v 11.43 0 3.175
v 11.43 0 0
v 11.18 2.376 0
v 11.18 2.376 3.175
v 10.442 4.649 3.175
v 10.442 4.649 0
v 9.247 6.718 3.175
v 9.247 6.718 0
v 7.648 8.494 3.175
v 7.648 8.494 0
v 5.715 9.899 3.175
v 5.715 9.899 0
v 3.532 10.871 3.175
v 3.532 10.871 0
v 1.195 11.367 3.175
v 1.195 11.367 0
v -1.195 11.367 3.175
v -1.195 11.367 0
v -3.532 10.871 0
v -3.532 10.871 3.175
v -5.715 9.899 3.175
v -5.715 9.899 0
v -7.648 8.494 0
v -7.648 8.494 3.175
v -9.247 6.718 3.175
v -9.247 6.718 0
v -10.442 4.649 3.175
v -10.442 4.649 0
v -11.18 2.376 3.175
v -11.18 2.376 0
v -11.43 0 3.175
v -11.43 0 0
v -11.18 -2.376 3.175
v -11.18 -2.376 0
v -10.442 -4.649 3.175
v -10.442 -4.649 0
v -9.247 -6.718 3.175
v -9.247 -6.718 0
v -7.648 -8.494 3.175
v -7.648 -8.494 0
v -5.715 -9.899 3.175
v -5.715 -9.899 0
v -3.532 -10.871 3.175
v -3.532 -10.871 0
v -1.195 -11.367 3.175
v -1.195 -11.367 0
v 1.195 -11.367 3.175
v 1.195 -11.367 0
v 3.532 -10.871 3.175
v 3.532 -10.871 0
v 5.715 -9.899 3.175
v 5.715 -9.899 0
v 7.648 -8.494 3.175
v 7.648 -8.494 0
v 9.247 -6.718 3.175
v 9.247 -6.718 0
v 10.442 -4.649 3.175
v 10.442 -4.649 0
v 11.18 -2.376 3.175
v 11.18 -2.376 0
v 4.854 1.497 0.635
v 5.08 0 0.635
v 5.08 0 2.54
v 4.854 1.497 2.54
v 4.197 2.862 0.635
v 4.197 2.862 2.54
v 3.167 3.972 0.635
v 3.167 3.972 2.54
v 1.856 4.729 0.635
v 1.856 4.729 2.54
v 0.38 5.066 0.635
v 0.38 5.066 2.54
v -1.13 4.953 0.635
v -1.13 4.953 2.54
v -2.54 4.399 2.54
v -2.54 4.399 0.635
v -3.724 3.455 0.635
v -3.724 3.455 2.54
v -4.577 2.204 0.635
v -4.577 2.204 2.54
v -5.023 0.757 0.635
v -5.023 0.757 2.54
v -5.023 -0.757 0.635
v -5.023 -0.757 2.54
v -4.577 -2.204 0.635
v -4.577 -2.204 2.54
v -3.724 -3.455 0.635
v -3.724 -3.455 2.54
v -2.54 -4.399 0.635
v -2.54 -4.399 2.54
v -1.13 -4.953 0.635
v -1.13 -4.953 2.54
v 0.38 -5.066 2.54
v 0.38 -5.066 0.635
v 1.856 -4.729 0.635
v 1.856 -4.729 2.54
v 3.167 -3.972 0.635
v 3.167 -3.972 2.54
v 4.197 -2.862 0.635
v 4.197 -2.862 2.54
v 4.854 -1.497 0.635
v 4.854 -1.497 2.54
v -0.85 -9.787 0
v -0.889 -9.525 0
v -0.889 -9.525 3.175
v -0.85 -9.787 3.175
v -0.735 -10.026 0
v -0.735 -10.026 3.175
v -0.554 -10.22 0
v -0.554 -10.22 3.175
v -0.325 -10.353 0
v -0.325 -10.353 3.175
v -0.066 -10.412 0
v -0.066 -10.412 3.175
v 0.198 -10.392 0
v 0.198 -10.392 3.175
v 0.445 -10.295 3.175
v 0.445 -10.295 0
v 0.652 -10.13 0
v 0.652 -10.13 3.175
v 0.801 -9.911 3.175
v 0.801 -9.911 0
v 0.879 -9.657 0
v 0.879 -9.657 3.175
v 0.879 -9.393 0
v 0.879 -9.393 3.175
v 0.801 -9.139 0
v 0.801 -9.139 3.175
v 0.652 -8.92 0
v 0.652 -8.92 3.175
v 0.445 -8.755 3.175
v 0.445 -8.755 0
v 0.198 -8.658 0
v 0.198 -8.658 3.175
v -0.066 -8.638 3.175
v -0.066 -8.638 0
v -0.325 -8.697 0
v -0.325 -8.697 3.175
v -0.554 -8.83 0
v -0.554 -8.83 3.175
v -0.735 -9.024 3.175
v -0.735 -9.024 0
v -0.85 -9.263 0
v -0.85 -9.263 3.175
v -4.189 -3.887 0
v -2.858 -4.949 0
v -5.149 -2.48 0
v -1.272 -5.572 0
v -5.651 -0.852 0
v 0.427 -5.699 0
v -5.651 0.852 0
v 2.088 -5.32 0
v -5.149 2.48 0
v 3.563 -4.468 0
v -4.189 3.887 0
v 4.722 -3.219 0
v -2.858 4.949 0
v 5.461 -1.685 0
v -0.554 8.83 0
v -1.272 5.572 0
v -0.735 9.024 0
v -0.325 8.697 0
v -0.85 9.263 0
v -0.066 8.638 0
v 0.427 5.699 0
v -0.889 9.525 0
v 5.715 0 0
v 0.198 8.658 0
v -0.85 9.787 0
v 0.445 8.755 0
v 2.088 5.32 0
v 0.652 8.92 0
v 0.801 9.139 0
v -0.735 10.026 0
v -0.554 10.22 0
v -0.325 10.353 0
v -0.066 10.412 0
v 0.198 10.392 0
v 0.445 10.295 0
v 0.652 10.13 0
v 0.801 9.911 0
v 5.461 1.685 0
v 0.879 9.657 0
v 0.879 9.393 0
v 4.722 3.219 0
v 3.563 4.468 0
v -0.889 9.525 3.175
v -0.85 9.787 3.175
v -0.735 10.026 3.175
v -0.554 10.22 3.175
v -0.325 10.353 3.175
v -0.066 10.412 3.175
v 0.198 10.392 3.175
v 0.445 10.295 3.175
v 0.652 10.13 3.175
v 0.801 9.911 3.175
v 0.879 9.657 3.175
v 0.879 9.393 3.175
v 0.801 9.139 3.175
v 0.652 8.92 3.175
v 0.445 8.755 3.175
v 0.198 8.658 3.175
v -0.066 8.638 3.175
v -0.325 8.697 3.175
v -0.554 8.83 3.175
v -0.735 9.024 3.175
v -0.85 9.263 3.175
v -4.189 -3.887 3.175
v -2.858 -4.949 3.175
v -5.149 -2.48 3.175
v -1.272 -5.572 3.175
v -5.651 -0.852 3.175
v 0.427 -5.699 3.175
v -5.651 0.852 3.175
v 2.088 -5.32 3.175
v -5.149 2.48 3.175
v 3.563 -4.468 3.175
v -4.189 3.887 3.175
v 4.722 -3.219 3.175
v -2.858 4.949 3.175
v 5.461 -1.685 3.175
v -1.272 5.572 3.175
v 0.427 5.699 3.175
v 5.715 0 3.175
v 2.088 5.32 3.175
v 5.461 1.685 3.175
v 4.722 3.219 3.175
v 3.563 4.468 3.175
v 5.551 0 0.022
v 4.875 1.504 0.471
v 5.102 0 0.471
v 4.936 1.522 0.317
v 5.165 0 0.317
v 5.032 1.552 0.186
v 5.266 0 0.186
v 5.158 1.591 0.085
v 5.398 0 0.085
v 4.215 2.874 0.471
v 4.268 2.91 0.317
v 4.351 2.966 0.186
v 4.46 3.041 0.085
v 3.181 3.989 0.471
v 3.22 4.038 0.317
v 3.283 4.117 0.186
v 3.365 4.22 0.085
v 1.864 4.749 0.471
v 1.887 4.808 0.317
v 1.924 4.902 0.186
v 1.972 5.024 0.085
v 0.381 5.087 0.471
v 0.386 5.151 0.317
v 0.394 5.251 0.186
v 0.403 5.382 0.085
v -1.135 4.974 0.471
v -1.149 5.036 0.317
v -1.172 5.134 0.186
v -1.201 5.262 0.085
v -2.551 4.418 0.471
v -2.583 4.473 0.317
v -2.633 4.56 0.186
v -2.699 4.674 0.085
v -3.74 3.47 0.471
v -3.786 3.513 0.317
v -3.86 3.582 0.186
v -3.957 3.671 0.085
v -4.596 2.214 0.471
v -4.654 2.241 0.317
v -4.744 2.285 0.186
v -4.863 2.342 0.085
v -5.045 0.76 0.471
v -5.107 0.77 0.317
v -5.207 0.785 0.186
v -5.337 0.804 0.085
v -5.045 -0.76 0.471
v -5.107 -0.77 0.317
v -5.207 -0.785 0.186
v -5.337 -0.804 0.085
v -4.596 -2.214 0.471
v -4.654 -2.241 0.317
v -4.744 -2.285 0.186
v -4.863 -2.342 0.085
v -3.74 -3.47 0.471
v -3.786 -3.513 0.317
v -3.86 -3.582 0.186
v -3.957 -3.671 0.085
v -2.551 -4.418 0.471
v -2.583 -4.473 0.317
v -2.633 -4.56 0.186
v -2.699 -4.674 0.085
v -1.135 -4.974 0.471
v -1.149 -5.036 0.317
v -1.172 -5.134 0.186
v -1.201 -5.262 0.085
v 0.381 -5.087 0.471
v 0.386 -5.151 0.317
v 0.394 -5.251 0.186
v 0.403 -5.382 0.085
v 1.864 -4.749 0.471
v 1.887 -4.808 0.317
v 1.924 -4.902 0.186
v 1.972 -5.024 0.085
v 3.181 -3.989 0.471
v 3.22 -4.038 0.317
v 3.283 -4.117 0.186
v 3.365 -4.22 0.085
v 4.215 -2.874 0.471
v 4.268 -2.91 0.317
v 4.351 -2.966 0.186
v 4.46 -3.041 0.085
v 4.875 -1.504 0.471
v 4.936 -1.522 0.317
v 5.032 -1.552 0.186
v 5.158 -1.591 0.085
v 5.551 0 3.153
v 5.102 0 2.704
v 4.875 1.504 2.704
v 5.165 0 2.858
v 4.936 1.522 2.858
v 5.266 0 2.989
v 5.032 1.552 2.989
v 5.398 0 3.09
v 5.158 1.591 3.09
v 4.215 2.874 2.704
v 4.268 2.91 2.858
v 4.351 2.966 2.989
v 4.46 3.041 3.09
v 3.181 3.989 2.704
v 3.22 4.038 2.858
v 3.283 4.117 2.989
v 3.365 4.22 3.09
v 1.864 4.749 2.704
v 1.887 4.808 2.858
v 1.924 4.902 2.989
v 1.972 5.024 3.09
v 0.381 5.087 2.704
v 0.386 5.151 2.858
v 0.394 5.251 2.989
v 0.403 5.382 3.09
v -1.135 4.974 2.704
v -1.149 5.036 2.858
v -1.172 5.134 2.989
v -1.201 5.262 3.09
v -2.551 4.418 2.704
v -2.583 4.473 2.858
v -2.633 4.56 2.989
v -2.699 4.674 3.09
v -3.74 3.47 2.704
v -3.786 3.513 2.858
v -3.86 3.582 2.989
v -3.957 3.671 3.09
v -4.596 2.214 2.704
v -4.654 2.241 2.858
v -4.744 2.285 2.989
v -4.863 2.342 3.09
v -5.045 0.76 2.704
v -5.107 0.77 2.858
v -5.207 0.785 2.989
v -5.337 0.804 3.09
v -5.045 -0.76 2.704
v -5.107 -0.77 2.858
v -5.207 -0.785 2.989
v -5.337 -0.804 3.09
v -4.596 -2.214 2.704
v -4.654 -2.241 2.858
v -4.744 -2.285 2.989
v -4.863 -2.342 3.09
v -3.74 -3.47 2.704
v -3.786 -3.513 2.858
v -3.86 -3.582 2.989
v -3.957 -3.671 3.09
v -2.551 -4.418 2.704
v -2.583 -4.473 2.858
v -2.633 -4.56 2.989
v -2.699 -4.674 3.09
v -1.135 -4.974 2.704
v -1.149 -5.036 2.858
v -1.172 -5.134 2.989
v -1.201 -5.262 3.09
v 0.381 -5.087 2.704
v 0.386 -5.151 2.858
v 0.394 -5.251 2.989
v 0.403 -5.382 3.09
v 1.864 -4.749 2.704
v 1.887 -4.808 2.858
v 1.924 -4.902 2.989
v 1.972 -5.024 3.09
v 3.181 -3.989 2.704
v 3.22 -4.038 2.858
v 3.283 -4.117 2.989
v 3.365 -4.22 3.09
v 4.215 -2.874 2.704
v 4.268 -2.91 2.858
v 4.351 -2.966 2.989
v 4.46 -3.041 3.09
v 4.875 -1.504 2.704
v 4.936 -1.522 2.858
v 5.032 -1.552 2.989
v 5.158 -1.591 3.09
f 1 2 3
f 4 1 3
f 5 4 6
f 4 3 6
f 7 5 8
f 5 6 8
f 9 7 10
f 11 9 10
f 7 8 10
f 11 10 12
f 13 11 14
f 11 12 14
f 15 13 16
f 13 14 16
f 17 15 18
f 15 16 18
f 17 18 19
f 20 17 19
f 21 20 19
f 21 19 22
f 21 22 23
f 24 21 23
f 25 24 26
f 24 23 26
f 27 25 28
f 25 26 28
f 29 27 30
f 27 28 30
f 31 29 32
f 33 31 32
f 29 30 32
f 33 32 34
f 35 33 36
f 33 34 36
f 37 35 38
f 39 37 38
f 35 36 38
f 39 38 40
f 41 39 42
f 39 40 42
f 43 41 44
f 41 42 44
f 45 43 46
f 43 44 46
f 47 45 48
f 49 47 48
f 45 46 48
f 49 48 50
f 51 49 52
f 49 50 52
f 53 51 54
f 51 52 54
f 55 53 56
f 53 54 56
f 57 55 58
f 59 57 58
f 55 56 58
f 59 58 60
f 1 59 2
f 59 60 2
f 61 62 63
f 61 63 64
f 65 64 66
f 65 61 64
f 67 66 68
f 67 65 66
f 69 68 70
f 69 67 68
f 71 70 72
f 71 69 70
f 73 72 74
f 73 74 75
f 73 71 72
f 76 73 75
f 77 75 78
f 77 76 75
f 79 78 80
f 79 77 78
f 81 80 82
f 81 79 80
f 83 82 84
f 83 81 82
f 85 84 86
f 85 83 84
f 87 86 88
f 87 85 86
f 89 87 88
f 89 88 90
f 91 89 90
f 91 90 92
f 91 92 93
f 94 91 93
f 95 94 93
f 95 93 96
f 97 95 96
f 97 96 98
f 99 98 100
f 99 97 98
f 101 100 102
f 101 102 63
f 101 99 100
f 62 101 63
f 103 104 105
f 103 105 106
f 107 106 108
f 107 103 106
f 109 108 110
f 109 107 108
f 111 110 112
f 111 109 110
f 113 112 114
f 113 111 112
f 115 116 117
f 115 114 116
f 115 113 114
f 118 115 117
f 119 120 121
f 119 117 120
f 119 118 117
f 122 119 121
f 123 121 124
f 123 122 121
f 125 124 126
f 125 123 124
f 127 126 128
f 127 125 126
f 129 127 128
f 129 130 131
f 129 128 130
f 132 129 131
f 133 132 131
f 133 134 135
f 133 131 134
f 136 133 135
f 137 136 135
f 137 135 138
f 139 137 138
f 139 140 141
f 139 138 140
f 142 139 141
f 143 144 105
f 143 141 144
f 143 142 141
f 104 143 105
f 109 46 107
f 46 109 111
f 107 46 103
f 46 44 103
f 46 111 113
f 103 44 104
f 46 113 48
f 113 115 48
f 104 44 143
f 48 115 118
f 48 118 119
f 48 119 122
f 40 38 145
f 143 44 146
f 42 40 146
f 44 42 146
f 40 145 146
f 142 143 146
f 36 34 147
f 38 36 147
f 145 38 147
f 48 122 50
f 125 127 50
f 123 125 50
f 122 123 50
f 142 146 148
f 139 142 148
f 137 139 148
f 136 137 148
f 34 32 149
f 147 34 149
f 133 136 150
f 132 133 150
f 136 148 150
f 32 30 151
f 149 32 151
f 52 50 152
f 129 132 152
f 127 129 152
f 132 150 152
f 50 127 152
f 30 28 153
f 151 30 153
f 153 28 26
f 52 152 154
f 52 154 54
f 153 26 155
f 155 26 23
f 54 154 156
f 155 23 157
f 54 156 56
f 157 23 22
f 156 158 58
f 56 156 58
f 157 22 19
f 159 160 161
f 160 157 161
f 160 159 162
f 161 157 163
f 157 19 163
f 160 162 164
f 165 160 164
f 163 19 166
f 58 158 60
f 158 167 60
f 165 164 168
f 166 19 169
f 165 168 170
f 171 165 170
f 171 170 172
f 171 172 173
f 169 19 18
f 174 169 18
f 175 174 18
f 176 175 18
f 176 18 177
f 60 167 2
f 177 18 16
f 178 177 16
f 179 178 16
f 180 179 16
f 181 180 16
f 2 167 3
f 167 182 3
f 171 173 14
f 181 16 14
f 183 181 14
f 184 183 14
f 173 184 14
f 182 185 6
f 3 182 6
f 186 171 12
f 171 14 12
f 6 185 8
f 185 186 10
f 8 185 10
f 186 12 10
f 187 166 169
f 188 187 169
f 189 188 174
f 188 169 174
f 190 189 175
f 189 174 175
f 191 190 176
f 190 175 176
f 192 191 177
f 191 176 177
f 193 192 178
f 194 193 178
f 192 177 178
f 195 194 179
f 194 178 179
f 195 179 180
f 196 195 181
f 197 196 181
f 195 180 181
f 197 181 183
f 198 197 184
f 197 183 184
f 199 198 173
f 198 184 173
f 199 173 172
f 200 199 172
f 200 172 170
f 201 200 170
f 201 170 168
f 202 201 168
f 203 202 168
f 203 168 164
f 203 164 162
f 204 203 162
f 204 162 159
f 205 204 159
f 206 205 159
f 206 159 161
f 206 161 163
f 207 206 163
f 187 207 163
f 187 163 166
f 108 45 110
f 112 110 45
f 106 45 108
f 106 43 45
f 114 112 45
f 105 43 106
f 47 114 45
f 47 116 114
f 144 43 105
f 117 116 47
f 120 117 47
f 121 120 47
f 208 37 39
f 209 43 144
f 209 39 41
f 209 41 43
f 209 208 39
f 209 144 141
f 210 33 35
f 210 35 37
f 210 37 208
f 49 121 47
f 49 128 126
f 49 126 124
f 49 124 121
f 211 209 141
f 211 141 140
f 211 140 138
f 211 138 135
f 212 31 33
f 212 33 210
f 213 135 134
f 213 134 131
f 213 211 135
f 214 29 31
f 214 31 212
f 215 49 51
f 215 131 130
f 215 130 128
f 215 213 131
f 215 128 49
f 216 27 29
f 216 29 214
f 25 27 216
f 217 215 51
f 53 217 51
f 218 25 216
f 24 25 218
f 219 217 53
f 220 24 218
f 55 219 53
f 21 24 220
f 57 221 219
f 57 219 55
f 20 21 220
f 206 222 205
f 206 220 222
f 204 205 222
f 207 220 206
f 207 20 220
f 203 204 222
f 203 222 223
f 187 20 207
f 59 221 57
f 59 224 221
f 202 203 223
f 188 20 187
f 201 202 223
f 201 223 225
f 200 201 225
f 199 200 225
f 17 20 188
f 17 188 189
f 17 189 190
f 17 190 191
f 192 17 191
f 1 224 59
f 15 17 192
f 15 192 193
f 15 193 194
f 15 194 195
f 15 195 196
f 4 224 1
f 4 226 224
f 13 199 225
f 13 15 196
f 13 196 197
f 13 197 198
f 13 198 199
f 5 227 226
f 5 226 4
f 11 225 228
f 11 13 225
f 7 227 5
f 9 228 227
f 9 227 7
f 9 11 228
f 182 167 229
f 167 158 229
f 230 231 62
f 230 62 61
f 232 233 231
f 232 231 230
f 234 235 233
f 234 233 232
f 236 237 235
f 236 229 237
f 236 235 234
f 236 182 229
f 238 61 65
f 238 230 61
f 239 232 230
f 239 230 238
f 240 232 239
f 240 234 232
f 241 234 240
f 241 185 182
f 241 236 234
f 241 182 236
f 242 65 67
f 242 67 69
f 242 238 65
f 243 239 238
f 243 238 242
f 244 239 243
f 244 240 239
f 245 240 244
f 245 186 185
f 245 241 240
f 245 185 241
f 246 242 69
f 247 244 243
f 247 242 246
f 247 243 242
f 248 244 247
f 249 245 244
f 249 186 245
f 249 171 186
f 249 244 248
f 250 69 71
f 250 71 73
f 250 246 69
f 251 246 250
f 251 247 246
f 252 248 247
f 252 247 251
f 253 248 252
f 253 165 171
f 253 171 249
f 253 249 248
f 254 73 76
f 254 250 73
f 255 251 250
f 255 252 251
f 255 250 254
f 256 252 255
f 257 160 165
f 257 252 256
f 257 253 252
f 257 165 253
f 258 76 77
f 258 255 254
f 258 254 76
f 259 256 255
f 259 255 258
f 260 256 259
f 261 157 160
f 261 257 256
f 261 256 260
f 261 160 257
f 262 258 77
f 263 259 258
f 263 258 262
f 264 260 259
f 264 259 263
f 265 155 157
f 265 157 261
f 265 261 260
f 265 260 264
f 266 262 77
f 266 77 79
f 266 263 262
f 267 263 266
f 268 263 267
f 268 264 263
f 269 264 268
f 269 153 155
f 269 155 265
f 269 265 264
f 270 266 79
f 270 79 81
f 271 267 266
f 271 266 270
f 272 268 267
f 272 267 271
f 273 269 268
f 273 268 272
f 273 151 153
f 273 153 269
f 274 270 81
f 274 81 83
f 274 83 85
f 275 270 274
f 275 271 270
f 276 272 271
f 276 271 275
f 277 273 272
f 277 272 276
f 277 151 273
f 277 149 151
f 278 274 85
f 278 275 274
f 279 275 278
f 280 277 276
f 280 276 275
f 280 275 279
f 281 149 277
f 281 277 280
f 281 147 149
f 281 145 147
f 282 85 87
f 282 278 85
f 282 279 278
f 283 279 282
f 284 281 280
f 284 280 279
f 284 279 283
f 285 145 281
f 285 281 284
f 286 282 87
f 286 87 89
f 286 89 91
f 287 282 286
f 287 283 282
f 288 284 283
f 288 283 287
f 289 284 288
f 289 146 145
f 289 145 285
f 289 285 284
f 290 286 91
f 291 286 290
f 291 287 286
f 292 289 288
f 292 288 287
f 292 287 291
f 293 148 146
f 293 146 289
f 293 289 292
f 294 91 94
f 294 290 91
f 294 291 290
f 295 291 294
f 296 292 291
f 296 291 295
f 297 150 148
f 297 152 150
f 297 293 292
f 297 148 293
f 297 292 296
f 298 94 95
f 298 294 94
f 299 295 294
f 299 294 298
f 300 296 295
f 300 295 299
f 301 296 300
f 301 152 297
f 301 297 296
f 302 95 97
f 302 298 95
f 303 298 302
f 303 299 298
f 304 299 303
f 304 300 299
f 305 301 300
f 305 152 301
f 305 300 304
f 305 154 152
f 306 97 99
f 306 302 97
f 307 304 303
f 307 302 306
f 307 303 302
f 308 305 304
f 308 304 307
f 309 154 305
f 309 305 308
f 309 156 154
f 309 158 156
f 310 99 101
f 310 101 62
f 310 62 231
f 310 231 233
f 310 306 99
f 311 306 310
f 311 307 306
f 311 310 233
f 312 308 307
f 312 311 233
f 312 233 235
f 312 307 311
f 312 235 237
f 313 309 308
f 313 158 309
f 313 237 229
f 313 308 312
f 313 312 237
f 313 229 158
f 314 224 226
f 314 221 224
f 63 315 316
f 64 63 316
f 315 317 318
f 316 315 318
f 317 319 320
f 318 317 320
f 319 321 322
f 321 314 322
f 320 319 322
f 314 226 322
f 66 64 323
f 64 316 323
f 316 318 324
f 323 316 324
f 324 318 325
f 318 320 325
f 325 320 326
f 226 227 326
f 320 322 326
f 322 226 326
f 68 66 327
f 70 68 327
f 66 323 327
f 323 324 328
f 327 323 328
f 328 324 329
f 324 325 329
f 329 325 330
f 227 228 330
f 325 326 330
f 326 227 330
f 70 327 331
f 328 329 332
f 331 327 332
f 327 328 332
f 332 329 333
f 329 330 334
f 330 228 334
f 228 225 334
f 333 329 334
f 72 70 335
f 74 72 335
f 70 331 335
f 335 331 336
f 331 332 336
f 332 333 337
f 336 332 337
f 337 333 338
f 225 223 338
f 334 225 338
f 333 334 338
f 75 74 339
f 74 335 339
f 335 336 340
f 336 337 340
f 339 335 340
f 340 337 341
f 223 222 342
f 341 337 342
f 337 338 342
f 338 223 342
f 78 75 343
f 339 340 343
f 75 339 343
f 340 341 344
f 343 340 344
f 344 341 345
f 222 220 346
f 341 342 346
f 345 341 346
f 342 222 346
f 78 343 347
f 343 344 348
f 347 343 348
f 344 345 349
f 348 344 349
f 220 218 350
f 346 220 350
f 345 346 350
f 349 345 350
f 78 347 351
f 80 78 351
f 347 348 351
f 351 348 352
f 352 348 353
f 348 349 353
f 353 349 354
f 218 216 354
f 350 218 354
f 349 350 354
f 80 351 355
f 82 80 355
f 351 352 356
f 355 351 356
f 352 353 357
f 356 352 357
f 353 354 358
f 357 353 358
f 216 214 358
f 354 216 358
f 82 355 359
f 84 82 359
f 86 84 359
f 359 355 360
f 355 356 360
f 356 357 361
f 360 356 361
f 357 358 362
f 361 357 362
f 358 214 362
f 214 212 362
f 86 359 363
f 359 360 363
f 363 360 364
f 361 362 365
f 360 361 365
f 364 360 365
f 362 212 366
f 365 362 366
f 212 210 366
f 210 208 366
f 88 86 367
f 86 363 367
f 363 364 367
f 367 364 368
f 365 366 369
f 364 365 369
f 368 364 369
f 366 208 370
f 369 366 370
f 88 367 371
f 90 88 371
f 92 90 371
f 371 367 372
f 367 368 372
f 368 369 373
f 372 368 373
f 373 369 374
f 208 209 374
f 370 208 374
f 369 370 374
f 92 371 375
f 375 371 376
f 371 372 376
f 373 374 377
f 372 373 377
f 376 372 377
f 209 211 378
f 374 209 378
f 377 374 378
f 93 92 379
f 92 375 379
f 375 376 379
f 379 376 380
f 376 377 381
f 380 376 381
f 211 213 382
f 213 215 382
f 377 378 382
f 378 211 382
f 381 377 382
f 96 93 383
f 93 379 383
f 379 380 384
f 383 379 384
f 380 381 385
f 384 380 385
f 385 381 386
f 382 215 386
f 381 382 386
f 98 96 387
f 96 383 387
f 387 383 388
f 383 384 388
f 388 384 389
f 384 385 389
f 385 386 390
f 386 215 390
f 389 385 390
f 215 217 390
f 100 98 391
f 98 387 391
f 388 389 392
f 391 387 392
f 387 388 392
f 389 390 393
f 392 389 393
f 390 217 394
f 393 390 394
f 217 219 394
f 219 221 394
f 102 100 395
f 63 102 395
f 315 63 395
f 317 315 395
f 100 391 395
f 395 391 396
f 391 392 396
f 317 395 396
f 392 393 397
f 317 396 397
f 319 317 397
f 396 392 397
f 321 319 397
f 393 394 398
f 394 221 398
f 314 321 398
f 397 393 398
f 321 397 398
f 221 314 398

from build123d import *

# Parameters (mm, degrees)
SKETCH1_R             = 11.43
SKETCH1_R_2           = 5.08
BOSS_EXTRUDE1_DEPTH   = 3.175
FILLET1_R             = 0.635
F_2_56_TAPPED_HOLE1_D = 1.778


with BuildPart() as part:
    # Sketch1 → Boss-Extrude1 (new body)
    with BuildSketch(Plane.XY):
        Circle(SKETCH1_R)
        Circle(SKETCH1_R_2, mode=Mode.SUBTRACT)
    extrude(amount=BOSS_EXTRUDE1_DEPTH)

    # Fillet1
    fillet1_edges = [part.edges().sort_by_distance(p)[0] for p in [
        (-5.08, 0, 0),
        (-5.08, 0, 3.175),
    ]]
    fillet(fillet1_edges, radius=FILLET1_R)

    # #2-56 Tapped Hole1 (through all)
    with Locations(Plane.XY.offset(3.175)):
        with Locations((0, 9.525)):
            f_2_56_tapped_hole1 = Hole(F_2_56_TAPPED_HOLE1_D / 2)

    # Mirror1: #2-56 Tapped Hole1 across plane
    add(f_2_56_tapped_hole1.mirror(Plane.ZX), mode=Mode.SUBTRACT)


solid = part.part
